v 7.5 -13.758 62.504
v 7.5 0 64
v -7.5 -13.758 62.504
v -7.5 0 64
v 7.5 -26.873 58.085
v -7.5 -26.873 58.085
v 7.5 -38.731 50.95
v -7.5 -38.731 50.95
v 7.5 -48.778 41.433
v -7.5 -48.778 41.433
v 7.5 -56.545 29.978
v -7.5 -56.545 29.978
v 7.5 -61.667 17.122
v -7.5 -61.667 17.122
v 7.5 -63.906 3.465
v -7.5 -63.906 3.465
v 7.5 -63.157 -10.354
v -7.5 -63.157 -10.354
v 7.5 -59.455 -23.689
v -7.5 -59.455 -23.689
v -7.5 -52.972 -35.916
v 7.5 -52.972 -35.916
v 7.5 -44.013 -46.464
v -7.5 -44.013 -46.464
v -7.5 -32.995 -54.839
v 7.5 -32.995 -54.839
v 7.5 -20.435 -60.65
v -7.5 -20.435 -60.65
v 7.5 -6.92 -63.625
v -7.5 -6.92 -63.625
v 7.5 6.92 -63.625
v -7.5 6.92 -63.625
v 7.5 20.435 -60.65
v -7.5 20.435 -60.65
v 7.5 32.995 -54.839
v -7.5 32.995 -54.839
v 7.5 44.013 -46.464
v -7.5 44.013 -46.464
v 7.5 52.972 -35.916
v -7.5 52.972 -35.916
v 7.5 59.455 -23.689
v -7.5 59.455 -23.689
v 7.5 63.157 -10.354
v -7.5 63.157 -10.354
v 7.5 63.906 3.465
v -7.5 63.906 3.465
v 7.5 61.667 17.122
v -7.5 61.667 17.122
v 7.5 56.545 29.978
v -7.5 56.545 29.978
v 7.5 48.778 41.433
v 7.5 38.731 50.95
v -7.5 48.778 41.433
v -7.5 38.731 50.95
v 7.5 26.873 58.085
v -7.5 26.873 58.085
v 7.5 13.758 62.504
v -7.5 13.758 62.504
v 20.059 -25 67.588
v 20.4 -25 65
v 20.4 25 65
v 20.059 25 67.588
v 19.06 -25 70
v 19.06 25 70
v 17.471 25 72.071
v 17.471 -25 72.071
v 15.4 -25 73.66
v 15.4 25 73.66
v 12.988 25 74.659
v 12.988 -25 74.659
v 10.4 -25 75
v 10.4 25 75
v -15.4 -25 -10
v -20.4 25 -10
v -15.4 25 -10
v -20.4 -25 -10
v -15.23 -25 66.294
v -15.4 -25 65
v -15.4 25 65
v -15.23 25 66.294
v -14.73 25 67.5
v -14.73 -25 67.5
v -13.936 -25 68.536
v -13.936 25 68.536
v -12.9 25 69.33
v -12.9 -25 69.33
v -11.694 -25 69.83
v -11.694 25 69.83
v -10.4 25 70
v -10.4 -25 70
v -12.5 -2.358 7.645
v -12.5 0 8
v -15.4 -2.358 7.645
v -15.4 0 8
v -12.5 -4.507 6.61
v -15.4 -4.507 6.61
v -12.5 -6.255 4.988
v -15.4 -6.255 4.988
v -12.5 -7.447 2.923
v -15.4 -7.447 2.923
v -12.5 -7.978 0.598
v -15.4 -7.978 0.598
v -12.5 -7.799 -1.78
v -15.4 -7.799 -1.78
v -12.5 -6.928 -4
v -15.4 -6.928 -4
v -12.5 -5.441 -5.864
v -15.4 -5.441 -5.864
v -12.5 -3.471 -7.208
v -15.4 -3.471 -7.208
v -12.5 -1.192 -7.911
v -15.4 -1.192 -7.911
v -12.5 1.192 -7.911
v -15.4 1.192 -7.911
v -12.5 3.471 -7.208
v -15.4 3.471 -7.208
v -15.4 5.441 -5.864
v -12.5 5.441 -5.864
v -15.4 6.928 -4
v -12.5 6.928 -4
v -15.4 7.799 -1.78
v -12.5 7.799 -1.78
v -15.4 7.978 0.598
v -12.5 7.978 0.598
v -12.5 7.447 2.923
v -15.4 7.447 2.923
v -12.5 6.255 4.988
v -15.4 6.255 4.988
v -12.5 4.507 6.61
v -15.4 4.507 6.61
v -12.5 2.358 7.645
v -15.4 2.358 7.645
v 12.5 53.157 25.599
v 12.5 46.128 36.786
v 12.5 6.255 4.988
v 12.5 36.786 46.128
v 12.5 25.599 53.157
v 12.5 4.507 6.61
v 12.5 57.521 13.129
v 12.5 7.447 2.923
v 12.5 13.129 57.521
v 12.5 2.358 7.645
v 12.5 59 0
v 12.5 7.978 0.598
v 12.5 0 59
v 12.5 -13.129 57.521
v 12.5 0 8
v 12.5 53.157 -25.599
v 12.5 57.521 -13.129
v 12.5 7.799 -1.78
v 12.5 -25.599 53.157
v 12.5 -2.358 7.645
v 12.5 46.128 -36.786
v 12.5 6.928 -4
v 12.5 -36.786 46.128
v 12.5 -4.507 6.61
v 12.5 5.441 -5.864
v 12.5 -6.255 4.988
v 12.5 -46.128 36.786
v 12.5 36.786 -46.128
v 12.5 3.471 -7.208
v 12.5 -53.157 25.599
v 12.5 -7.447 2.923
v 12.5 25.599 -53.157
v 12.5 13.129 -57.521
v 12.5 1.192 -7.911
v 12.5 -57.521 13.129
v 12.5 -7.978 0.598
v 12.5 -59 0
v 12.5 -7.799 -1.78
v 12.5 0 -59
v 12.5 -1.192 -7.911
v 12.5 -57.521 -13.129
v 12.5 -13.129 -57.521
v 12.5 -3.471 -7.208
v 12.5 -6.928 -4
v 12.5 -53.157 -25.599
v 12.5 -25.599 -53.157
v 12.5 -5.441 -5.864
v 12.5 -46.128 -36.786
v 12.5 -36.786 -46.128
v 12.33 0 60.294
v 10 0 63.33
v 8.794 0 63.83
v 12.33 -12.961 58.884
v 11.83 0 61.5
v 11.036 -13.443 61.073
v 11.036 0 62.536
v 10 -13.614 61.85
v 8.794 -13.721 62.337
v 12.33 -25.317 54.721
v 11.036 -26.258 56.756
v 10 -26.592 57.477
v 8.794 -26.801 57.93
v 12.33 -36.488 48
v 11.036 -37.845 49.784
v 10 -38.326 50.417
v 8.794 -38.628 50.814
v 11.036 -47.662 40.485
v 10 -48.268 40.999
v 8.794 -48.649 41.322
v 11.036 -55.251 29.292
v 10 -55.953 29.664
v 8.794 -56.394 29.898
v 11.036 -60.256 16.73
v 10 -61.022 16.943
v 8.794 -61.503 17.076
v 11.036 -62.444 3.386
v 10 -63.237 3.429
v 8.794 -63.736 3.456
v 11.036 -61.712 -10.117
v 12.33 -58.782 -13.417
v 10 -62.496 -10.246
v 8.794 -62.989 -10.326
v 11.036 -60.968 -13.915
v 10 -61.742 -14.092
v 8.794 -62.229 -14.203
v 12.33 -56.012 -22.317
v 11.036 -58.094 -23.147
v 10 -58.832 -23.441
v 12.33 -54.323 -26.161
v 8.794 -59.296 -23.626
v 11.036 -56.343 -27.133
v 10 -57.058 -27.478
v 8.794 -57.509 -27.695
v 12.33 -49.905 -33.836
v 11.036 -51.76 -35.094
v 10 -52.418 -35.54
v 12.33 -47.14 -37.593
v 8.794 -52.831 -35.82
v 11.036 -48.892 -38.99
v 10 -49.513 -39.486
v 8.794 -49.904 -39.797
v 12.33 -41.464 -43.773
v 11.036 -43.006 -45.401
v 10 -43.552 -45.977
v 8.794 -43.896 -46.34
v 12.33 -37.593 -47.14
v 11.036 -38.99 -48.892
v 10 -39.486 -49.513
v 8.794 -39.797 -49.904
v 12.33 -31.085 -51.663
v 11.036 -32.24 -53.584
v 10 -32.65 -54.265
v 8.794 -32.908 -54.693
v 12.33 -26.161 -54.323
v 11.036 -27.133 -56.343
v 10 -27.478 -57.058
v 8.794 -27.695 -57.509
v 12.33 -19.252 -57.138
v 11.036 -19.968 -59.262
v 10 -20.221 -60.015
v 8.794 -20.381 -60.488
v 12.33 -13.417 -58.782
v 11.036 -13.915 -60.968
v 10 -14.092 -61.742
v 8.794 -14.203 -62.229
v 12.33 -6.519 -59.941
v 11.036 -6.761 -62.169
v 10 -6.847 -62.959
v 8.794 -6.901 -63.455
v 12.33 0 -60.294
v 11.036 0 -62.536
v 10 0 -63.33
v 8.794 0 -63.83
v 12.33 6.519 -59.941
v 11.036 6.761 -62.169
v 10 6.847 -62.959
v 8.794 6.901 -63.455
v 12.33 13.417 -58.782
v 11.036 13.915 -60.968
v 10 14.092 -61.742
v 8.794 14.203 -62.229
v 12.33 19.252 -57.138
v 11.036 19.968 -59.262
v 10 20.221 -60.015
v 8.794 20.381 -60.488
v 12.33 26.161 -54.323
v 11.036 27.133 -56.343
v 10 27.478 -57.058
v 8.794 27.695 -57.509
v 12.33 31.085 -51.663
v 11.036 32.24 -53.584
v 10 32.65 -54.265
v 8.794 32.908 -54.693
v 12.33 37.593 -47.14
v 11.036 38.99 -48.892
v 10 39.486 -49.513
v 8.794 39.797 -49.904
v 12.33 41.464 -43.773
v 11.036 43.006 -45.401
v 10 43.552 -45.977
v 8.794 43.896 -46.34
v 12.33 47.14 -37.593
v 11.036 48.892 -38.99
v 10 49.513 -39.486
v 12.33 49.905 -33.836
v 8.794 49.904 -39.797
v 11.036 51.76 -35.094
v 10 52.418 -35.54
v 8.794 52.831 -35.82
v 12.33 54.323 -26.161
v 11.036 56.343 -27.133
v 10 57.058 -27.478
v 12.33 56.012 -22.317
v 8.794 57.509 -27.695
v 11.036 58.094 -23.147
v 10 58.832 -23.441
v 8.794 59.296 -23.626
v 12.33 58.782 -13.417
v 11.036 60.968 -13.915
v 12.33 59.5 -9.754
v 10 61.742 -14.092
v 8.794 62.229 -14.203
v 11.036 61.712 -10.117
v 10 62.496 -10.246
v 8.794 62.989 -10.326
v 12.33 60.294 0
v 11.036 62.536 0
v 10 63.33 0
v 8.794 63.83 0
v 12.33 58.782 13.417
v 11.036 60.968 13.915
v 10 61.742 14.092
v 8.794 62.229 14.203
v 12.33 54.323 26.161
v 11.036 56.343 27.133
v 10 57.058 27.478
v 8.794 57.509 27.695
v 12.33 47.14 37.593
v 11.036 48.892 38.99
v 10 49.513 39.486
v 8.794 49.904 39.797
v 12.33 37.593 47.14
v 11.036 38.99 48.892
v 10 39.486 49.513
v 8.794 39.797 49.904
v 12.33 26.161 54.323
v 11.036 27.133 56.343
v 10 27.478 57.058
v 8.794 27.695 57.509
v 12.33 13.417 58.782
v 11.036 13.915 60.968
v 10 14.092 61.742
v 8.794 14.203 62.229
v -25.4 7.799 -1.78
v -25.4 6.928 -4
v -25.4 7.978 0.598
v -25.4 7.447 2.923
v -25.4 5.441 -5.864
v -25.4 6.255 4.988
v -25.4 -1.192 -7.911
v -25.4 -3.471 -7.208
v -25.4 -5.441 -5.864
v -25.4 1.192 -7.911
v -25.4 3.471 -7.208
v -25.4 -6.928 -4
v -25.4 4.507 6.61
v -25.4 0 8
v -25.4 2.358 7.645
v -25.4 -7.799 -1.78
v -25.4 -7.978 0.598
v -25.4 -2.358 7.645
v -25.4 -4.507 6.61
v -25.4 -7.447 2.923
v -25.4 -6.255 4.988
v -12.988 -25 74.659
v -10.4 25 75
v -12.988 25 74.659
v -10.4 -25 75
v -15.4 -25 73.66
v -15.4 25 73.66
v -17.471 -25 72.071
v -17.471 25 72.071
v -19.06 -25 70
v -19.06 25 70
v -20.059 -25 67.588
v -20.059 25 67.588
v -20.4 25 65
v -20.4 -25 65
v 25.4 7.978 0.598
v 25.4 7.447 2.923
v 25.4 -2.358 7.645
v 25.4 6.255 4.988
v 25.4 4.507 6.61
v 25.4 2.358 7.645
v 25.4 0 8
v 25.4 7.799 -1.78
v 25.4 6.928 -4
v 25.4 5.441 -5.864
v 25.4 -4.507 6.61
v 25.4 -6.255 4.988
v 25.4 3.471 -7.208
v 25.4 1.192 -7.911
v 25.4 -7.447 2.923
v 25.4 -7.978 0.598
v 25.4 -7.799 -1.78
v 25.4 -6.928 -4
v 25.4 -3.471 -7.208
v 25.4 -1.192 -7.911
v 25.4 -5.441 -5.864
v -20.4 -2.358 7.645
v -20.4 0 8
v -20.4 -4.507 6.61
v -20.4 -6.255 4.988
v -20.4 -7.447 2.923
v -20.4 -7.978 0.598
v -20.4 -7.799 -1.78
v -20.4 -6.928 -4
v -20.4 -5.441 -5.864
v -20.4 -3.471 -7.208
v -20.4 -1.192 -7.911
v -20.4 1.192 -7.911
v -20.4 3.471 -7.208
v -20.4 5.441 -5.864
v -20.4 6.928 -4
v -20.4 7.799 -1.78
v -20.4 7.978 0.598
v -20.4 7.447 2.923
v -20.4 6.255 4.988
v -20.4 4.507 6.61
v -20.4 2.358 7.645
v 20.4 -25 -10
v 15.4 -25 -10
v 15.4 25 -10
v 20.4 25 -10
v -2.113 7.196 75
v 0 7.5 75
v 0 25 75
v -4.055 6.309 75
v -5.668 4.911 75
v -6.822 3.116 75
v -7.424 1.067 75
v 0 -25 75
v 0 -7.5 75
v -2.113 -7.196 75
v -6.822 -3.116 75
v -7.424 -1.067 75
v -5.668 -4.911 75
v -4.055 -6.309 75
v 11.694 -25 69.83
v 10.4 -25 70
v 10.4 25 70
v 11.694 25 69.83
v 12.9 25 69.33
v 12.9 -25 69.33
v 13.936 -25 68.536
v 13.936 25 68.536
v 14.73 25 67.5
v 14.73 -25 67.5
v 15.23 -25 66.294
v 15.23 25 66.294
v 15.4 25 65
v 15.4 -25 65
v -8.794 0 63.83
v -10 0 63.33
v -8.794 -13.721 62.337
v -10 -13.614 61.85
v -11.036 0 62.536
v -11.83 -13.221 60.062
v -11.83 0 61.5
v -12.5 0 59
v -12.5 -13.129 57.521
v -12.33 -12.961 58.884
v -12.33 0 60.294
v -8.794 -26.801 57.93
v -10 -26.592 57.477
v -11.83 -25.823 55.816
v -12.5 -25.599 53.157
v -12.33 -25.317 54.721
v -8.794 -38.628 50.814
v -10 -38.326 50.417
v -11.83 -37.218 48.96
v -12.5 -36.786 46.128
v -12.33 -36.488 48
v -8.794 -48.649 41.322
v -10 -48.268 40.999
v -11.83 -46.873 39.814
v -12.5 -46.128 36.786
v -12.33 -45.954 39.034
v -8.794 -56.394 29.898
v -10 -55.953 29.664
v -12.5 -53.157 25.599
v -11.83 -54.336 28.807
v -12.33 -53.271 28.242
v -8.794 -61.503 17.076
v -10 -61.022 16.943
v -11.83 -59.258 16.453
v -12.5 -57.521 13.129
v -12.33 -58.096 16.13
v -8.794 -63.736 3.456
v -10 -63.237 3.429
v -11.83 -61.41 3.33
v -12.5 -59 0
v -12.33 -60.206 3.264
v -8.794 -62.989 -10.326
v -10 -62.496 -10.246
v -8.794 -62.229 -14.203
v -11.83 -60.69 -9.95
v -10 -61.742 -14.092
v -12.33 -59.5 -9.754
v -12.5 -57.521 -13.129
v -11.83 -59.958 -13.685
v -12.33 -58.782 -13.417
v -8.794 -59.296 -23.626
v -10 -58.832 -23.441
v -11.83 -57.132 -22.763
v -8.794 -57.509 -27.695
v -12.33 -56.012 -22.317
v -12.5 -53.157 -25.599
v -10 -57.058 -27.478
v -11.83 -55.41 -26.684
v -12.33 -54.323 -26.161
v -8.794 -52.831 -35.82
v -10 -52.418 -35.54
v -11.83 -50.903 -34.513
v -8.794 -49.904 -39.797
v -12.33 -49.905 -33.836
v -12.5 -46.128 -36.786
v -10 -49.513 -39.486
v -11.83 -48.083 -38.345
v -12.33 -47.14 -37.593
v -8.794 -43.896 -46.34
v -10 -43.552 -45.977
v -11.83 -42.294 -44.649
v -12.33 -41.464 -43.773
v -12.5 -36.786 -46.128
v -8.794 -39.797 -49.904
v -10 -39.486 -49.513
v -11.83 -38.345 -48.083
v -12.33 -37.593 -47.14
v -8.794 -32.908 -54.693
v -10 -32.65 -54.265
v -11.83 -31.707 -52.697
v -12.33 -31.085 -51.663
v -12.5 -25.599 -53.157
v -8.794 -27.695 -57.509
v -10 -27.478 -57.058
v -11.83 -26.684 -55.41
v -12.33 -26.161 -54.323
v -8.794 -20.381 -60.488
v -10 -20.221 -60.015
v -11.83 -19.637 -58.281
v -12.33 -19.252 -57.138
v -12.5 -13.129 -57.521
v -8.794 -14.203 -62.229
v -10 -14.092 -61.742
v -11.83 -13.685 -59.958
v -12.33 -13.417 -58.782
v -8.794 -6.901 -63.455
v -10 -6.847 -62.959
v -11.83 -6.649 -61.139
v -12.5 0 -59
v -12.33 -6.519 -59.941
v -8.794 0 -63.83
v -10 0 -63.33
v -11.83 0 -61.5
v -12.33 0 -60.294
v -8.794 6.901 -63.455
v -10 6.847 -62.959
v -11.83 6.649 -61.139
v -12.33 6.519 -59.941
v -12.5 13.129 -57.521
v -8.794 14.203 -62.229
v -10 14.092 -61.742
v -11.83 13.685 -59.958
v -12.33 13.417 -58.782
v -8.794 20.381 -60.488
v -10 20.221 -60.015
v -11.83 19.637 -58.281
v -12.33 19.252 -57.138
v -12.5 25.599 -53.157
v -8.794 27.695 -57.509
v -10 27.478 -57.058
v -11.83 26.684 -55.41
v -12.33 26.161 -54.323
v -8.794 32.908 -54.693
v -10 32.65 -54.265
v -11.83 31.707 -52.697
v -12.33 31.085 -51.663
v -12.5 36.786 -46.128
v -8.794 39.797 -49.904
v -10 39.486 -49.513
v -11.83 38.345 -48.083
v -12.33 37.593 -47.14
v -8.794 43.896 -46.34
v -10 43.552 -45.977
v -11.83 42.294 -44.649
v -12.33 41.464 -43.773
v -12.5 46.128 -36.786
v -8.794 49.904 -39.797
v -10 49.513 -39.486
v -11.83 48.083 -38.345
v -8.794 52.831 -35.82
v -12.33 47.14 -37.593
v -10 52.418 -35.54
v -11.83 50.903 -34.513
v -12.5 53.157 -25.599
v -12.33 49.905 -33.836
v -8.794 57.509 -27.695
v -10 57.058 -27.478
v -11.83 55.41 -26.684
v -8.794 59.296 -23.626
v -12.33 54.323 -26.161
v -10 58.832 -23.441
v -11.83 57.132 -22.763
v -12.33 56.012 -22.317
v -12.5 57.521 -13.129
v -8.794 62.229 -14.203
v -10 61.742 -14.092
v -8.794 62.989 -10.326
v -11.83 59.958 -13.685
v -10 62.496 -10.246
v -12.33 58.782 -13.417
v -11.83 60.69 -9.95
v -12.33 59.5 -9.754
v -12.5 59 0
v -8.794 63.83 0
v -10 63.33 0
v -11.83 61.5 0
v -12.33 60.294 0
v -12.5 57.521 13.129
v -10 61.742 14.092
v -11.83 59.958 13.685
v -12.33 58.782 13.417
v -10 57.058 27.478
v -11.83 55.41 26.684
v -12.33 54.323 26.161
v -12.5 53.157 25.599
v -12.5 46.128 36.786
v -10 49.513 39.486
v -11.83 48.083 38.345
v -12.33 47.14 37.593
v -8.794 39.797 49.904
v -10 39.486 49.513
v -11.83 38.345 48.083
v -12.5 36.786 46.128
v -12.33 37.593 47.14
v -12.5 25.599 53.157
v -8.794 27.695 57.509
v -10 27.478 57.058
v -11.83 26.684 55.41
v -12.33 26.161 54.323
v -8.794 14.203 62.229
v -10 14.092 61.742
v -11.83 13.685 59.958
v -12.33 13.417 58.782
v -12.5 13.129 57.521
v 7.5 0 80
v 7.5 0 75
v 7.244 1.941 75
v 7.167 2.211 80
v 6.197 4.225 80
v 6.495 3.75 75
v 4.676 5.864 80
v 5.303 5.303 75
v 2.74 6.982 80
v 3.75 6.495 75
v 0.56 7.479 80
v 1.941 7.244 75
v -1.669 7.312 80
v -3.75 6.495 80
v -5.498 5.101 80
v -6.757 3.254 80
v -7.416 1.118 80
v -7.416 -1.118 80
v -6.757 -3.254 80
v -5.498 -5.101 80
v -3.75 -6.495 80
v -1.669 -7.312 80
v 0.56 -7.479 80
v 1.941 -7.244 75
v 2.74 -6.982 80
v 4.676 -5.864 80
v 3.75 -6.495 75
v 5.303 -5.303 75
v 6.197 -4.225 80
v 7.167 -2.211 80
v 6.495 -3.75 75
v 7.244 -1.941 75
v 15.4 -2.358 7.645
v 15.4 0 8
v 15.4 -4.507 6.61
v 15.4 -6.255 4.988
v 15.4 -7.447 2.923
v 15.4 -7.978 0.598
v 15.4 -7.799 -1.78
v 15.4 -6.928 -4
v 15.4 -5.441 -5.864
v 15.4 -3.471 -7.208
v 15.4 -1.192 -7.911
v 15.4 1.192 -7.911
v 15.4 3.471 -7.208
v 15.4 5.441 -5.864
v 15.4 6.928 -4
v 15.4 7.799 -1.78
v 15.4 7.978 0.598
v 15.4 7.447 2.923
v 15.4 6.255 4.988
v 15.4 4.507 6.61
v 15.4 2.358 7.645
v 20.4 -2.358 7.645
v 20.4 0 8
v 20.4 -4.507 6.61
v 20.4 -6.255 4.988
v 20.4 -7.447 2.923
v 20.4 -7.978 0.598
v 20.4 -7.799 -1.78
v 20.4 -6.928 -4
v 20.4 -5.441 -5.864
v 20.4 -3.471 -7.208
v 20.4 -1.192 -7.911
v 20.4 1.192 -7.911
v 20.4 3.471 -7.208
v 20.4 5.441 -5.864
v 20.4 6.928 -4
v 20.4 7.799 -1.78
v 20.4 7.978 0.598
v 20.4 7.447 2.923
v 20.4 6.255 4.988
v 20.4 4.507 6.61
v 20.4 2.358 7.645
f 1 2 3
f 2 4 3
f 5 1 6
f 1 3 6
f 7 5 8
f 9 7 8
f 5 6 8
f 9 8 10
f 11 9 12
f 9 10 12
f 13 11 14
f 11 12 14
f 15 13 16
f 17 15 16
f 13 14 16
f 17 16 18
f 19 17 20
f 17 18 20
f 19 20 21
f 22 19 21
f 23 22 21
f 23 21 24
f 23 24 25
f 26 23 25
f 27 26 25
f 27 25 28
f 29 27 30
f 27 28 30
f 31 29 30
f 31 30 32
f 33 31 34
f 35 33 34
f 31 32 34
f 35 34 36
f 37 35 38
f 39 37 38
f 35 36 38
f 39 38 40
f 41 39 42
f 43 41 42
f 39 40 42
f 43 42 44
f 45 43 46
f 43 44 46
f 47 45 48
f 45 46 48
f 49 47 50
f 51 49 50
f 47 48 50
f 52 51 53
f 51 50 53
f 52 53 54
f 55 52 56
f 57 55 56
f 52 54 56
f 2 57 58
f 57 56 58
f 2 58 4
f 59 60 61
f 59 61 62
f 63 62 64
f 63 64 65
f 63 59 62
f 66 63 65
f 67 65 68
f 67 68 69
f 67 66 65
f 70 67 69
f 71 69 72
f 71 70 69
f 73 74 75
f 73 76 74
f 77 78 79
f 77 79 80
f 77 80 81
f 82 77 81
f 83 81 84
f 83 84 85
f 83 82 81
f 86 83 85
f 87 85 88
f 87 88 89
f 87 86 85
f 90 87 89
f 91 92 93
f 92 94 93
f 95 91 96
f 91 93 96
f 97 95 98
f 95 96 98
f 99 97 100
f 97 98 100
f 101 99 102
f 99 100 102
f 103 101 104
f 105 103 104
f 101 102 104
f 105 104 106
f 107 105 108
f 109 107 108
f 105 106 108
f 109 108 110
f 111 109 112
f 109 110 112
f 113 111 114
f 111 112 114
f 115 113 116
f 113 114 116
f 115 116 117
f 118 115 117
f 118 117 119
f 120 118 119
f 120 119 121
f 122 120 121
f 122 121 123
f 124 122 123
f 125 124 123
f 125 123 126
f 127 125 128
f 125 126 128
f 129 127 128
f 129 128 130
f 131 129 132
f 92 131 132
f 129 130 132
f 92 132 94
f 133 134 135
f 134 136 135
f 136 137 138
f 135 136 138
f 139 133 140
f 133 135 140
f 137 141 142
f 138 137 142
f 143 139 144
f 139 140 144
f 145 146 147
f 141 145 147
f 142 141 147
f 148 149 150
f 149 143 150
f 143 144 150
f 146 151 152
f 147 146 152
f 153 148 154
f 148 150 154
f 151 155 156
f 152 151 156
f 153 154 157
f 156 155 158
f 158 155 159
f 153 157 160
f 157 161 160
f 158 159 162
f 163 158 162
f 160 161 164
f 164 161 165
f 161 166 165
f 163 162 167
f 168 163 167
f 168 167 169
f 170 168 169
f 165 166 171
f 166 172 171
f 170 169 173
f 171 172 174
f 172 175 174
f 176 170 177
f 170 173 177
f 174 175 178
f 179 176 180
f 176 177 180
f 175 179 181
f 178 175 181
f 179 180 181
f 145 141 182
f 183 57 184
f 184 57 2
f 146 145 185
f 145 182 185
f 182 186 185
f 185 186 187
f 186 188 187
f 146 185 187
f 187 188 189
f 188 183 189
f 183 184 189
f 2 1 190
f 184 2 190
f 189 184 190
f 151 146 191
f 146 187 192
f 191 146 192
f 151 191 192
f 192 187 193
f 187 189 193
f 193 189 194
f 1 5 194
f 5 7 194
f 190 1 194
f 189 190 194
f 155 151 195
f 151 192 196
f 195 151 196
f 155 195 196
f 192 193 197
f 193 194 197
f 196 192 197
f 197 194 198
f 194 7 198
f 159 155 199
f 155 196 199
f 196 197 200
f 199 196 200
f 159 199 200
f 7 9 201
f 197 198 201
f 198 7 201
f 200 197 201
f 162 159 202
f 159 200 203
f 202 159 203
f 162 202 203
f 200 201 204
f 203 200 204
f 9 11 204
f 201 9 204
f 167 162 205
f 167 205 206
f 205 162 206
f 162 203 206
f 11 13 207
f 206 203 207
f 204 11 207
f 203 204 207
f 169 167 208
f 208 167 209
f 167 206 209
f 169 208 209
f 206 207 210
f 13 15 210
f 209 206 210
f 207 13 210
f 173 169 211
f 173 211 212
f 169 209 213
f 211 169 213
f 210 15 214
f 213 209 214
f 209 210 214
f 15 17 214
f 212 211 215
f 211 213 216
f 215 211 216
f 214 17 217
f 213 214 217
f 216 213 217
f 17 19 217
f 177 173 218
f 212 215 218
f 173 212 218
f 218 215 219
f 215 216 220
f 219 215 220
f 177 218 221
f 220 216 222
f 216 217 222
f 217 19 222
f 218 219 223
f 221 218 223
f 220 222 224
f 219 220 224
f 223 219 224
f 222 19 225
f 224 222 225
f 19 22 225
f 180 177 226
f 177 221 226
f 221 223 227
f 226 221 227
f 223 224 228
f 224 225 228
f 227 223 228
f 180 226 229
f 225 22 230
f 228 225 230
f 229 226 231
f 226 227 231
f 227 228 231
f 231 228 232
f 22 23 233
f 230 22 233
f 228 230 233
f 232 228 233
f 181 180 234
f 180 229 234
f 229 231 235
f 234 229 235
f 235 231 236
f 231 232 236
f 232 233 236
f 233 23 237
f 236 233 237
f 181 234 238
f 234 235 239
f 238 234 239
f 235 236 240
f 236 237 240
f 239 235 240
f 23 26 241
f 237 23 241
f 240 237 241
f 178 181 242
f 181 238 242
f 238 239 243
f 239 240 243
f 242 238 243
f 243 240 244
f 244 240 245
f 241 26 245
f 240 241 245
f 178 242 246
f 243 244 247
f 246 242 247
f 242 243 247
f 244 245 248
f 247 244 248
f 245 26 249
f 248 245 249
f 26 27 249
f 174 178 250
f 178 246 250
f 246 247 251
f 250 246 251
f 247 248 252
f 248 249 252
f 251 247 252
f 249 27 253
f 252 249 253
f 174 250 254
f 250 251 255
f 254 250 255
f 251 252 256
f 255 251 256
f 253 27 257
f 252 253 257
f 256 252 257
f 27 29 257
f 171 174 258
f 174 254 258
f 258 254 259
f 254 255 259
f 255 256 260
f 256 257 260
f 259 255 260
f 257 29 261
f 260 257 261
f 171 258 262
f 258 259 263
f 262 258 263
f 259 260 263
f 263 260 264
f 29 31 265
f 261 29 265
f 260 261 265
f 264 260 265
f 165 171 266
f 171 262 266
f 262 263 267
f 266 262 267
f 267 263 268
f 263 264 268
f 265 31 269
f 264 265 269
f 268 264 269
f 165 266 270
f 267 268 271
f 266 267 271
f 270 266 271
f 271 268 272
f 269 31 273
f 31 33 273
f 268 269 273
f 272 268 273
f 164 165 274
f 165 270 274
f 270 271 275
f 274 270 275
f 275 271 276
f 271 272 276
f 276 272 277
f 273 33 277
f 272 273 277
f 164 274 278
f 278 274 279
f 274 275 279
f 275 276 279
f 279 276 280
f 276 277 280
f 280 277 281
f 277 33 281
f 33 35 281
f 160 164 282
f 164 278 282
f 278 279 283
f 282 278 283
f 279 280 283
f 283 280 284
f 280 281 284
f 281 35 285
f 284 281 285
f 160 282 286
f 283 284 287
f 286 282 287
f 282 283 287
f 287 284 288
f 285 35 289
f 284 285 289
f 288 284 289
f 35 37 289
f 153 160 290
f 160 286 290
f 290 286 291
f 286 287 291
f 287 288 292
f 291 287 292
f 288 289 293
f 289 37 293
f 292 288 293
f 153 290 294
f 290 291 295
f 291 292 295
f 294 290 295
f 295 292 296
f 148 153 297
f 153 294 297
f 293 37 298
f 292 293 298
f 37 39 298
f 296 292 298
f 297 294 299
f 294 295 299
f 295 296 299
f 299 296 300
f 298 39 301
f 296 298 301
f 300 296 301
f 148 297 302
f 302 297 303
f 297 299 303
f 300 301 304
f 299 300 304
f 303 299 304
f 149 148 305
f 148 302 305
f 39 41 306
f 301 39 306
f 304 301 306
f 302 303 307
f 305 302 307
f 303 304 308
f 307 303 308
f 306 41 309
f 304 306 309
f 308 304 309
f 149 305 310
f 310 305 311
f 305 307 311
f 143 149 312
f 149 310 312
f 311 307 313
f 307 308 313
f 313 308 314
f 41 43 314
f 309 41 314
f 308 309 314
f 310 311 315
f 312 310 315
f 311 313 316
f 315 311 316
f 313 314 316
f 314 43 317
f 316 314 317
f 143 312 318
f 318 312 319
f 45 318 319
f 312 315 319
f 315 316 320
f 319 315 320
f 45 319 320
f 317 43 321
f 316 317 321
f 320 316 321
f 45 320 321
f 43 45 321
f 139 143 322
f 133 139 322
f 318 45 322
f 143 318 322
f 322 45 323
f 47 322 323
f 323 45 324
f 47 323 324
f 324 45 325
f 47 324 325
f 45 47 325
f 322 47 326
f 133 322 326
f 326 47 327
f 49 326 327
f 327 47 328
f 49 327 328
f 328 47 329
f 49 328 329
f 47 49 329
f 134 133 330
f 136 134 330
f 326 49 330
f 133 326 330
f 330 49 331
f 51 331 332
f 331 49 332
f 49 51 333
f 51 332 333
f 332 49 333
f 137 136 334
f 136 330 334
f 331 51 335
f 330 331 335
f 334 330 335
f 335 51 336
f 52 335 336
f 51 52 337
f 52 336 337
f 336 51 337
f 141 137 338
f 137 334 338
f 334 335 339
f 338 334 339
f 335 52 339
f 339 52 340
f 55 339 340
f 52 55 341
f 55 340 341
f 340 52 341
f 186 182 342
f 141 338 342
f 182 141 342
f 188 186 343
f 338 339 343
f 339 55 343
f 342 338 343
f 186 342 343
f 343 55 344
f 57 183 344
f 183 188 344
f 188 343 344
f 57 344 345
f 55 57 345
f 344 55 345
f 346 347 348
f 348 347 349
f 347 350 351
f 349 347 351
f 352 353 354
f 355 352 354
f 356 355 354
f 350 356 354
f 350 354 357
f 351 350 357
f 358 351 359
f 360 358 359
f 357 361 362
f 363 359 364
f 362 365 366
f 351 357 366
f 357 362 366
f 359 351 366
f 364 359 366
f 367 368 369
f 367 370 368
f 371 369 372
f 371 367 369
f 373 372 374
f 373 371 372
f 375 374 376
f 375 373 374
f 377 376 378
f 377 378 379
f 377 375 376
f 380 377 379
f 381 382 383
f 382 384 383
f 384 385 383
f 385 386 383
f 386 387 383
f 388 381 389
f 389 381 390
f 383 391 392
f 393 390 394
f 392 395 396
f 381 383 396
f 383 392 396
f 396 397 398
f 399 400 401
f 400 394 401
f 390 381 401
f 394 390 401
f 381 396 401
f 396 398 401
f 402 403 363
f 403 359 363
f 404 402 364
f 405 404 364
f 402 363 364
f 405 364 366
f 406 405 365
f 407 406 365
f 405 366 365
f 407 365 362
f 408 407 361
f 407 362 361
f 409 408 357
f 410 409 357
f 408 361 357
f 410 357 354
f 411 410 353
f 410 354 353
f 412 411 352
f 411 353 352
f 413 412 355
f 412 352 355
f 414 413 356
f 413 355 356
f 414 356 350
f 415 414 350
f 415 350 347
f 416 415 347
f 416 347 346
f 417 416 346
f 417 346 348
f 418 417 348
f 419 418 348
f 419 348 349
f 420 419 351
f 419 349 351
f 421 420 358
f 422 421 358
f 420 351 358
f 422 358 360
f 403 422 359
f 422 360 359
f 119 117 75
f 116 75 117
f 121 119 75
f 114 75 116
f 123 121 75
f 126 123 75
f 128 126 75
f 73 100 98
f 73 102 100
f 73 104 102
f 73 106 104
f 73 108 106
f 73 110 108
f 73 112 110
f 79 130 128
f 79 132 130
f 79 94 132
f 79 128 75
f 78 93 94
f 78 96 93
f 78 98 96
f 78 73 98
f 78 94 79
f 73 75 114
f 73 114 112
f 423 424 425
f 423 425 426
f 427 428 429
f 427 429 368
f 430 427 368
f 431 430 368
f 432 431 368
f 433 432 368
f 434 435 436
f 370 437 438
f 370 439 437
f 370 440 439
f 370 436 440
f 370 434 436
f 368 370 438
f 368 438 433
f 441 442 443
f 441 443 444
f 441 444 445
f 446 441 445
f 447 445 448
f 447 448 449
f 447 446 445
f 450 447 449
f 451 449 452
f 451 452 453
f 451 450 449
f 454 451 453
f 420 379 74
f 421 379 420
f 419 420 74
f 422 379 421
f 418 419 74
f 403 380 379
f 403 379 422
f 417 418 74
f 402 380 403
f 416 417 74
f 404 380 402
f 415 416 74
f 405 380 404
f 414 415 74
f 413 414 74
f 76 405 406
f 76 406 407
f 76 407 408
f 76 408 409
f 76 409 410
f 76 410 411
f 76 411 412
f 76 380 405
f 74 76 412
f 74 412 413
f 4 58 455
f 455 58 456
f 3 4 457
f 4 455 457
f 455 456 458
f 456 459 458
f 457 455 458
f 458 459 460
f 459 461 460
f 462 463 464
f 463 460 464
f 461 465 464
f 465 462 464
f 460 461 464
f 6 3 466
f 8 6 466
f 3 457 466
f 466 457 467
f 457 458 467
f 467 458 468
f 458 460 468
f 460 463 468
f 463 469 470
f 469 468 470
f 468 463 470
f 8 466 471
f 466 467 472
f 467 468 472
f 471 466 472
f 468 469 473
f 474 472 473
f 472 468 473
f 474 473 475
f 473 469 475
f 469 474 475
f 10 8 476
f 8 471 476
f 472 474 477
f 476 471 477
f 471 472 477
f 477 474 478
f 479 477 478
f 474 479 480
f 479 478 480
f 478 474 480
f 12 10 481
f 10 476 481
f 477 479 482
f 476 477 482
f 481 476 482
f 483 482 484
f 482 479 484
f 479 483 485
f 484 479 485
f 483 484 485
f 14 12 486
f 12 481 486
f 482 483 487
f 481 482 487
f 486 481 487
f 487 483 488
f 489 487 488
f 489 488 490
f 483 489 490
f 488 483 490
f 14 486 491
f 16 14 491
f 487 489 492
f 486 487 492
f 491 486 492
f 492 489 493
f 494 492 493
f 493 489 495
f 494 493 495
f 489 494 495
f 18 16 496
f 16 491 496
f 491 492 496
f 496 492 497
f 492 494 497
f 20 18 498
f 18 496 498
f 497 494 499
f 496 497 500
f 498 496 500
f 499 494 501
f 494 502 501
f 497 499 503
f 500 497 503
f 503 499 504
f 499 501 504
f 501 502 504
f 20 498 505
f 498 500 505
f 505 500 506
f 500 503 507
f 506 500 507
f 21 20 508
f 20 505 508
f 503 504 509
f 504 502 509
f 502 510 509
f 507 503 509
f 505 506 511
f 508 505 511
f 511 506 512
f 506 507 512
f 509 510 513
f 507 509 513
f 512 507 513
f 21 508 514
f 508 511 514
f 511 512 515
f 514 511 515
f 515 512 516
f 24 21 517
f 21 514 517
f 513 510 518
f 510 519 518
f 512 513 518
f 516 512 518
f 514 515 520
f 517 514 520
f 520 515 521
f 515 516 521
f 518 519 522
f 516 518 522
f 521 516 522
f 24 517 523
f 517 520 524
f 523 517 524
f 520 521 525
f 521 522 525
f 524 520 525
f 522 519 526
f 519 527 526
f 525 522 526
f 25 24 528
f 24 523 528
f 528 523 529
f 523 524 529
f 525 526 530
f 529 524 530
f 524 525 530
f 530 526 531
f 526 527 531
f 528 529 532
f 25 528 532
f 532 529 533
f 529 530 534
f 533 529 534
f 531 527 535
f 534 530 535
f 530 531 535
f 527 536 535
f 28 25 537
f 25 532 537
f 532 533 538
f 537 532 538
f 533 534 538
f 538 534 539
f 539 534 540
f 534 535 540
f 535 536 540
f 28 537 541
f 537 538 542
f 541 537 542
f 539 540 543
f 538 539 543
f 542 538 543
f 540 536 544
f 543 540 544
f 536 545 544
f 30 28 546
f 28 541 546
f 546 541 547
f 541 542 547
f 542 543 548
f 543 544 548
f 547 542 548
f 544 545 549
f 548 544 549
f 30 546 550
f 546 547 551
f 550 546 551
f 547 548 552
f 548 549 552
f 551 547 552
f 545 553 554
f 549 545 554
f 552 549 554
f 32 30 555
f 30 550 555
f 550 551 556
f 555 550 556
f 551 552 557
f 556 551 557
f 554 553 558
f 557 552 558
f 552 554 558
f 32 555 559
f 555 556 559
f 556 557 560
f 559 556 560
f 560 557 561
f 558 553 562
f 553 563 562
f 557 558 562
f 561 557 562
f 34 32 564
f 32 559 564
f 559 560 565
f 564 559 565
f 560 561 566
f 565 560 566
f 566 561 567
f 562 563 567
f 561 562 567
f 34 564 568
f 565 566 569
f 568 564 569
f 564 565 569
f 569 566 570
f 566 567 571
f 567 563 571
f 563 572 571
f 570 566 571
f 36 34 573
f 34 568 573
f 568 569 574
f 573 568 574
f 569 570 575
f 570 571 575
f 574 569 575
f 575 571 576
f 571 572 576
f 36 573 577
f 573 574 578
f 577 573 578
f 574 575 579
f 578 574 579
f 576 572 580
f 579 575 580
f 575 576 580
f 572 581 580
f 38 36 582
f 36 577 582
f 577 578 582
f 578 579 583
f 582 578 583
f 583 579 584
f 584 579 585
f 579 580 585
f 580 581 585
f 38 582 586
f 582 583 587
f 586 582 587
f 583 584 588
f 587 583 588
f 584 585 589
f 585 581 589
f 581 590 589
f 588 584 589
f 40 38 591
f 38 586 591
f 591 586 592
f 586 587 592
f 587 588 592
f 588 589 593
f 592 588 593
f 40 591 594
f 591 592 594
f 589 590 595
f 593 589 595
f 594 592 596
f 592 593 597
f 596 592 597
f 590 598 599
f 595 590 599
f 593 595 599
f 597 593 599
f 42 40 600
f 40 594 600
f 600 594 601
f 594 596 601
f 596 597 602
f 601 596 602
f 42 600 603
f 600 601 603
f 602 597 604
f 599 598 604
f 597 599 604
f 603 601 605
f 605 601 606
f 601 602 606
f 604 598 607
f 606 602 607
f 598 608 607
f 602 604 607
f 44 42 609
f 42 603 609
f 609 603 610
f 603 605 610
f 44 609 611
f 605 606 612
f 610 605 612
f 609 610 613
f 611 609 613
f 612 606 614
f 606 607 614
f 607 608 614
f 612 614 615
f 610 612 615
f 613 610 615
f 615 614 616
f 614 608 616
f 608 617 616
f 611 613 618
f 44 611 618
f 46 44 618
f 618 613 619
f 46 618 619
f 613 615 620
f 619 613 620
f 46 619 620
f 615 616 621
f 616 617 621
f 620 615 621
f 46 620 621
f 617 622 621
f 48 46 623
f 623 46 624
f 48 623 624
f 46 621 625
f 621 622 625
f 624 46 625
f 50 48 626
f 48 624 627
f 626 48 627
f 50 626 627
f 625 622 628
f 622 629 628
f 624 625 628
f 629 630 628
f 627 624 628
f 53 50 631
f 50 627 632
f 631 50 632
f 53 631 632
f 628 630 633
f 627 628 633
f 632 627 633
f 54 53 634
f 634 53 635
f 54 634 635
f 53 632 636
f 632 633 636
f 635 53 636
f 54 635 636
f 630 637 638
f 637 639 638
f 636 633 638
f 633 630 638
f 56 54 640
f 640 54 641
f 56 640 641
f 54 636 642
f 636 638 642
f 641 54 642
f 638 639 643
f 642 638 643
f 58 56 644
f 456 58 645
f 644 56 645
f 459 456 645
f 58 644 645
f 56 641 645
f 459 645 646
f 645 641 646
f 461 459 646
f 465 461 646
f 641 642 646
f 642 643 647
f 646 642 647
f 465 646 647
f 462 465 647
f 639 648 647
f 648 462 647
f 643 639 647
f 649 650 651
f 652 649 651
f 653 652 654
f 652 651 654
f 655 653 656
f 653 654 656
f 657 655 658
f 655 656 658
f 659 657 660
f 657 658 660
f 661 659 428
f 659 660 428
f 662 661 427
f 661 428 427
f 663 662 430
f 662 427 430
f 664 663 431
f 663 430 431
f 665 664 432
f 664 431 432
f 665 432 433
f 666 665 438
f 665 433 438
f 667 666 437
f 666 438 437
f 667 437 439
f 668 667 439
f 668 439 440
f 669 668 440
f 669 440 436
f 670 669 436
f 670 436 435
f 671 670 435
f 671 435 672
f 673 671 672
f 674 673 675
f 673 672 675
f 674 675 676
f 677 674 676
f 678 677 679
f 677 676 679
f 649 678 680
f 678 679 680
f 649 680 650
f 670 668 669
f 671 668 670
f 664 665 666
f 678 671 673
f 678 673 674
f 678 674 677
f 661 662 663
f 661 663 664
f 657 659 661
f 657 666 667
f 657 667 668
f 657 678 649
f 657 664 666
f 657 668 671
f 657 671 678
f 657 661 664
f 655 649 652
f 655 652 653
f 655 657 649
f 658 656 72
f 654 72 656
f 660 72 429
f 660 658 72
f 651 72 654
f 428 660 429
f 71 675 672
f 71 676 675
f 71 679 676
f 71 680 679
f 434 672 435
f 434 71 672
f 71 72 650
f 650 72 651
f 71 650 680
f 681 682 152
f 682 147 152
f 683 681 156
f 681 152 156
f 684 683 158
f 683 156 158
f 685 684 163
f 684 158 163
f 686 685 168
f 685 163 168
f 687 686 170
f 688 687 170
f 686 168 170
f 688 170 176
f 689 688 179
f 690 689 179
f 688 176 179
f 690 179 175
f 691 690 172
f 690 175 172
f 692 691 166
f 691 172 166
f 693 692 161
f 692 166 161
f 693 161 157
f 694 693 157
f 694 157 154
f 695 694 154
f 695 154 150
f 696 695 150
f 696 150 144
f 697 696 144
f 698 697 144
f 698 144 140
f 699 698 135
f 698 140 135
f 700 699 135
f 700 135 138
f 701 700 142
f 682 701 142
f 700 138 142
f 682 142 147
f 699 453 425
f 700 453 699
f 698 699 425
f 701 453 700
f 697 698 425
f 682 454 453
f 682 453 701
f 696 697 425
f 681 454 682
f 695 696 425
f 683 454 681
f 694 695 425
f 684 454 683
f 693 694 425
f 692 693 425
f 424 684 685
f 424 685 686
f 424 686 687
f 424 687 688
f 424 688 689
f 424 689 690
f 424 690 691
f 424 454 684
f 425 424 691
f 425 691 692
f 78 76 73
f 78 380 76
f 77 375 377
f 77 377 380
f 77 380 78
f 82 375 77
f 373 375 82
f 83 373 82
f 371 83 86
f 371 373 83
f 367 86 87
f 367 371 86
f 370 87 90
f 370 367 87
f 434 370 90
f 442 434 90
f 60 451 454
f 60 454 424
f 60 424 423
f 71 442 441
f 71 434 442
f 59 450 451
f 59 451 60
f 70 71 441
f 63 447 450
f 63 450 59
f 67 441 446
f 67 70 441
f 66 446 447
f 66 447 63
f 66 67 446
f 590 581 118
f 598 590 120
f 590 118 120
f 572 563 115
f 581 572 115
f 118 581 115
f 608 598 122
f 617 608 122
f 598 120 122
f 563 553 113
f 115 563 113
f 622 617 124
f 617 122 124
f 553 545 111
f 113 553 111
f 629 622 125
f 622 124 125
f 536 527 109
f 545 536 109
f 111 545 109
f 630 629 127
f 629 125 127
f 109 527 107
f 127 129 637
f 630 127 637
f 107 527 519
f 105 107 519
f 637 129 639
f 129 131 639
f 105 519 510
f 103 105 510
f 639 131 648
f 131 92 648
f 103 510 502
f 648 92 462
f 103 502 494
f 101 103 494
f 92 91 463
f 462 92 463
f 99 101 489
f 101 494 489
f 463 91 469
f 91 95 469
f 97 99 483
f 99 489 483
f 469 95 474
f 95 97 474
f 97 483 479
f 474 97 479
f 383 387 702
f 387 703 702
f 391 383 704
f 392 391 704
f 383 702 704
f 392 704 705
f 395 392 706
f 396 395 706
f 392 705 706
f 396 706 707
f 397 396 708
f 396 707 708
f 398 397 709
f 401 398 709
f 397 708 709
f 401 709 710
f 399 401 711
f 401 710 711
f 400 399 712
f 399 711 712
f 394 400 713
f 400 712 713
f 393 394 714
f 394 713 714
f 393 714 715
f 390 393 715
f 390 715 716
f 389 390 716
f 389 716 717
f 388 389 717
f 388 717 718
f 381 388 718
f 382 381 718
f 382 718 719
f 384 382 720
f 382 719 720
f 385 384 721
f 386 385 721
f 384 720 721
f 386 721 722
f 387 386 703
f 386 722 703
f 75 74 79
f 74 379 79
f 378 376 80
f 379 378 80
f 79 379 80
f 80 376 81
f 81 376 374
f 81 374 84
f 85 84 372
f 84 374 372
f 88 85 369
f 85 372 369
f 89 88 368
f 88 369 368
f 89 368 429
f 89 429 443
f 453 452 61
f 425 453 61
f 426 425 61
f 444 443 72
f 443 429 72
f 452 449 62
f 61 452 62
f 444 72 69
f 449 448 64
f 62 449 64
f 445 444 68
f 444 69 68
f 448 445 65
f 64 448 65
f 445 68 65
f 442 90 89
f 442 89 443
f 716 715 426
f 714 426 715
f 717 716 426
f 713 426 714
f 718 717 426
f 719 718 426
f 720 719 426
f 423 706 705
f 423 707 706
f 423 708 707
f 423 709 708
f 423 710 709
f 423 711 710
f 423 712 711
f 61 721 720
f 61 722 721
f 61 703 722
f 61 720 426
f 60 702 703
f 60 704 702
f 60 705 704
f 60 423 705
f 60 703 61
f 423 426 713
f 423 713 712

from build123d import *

# Parameters (mm, degrees)
F3_DEPTH = 25
F4_R     = 7.5
F5_DEPTH = 5


# Not quite as in the source:
# - ends of sketch curves that miss each other by under 0.0002 mm in the source are joined


with BuildPart() as f1:
    # F0 (on Front) → F1 (revolve)
    with BuildSketch(Plane.XZ):
        with BuildLine():
            Line((-20.4, 8), (-25.4, 8))
            Line((-25.4, 8), (-25.4, 0))
            Line((-25.4, 0), (-12.5, 0))
            Line((-12.5, 0), (12.5, 0))
            Line((12.5, 0), (25.4, 0))
            Line((25.4, 0), (25.4, 8))
            Line((25.4, 8), (20.4, 8))
            Line((20.4, 8), (20.4, 5))
            Line((20.4, 5), (15.4, 5))
            Line((15.4, 5), (15.4, 8))
            Line((15.4, 8), (12.5, 8))
            Line((12.5, 8), (12.5, 59))
            ThreePointArc((12.5, 59), (11.0355339059, 62.5355339059), (7.5, 64))
            Line((7.5, 64), (-7.5, 64))
            ThreePointArc((-7.5, 64), (-11.0355339059, 62.5355339059), (-12.5, 59))
            Line((-12.5, 59), (-12.5, 8))
            Line((-12.5, 8), (-15.4, 8))
            Line((-15.4, 8), (-15.4, 5))
            Line((-15.4, 5), (-20.4, 5))
            Line((-20.4, 5), (-20.4, 8))
        make_face()
    revolve(axis=Axis((-6.7645025283, 0, 0), (1, 0, 0)))

    # F2 (on Front) → F3 (join, symmetric)
    with BuildSketch(Plane.XZ):
        with BuildLine():
            Line((-20.4, -10), (-15.4, -10))
            Line((-15.4, -10), (-15.4, 65.000000298))
            ThreePointArc((-15.4, 65.000000298), (-13.9355339059, 68.535534204), (-10.4, 70.000000298))
            Line((-10.4, 70.000000298), (0, 70.000000298))
            Line((0, 70.000000298), (10.4, 70.000000298))
            ThreePointArc((10.4, 70.000000298), (13.9355339059, 68.535534204), (15.4, 65.000000298))
            Line((15.4, 65.000000298), (15.4, -10))
            Line((15.4, -10), (20.4, -10))
            Line((20.4, -10), (20.4, 65.000000298))
            ThreePointArc((20.4, 65.000000298), (17.4710678407, 72.0710681387), (10.4, 75.0000003388))
            Line((10.4, 75.0000003388), (0, 75))
            Line((0, 75), (-10.4, 75))
            ThreePointArc((-10.4, 75), (-17.4710678407, 72.0710681387), (-20.4000000408, 65.000000298))
            Line((-20.4000000408, 65.000000298), (-20.4, -10))
        make_face()
    extrude(amount=F3_DEPTH, both=True)

    # F4 (on face) → F5 (join)
    with BuildSketch(Plane.XY.offset(75)):
        Circle(F4_R)
    extrude(amount=F5_DEPTH)


solid = f1.part
